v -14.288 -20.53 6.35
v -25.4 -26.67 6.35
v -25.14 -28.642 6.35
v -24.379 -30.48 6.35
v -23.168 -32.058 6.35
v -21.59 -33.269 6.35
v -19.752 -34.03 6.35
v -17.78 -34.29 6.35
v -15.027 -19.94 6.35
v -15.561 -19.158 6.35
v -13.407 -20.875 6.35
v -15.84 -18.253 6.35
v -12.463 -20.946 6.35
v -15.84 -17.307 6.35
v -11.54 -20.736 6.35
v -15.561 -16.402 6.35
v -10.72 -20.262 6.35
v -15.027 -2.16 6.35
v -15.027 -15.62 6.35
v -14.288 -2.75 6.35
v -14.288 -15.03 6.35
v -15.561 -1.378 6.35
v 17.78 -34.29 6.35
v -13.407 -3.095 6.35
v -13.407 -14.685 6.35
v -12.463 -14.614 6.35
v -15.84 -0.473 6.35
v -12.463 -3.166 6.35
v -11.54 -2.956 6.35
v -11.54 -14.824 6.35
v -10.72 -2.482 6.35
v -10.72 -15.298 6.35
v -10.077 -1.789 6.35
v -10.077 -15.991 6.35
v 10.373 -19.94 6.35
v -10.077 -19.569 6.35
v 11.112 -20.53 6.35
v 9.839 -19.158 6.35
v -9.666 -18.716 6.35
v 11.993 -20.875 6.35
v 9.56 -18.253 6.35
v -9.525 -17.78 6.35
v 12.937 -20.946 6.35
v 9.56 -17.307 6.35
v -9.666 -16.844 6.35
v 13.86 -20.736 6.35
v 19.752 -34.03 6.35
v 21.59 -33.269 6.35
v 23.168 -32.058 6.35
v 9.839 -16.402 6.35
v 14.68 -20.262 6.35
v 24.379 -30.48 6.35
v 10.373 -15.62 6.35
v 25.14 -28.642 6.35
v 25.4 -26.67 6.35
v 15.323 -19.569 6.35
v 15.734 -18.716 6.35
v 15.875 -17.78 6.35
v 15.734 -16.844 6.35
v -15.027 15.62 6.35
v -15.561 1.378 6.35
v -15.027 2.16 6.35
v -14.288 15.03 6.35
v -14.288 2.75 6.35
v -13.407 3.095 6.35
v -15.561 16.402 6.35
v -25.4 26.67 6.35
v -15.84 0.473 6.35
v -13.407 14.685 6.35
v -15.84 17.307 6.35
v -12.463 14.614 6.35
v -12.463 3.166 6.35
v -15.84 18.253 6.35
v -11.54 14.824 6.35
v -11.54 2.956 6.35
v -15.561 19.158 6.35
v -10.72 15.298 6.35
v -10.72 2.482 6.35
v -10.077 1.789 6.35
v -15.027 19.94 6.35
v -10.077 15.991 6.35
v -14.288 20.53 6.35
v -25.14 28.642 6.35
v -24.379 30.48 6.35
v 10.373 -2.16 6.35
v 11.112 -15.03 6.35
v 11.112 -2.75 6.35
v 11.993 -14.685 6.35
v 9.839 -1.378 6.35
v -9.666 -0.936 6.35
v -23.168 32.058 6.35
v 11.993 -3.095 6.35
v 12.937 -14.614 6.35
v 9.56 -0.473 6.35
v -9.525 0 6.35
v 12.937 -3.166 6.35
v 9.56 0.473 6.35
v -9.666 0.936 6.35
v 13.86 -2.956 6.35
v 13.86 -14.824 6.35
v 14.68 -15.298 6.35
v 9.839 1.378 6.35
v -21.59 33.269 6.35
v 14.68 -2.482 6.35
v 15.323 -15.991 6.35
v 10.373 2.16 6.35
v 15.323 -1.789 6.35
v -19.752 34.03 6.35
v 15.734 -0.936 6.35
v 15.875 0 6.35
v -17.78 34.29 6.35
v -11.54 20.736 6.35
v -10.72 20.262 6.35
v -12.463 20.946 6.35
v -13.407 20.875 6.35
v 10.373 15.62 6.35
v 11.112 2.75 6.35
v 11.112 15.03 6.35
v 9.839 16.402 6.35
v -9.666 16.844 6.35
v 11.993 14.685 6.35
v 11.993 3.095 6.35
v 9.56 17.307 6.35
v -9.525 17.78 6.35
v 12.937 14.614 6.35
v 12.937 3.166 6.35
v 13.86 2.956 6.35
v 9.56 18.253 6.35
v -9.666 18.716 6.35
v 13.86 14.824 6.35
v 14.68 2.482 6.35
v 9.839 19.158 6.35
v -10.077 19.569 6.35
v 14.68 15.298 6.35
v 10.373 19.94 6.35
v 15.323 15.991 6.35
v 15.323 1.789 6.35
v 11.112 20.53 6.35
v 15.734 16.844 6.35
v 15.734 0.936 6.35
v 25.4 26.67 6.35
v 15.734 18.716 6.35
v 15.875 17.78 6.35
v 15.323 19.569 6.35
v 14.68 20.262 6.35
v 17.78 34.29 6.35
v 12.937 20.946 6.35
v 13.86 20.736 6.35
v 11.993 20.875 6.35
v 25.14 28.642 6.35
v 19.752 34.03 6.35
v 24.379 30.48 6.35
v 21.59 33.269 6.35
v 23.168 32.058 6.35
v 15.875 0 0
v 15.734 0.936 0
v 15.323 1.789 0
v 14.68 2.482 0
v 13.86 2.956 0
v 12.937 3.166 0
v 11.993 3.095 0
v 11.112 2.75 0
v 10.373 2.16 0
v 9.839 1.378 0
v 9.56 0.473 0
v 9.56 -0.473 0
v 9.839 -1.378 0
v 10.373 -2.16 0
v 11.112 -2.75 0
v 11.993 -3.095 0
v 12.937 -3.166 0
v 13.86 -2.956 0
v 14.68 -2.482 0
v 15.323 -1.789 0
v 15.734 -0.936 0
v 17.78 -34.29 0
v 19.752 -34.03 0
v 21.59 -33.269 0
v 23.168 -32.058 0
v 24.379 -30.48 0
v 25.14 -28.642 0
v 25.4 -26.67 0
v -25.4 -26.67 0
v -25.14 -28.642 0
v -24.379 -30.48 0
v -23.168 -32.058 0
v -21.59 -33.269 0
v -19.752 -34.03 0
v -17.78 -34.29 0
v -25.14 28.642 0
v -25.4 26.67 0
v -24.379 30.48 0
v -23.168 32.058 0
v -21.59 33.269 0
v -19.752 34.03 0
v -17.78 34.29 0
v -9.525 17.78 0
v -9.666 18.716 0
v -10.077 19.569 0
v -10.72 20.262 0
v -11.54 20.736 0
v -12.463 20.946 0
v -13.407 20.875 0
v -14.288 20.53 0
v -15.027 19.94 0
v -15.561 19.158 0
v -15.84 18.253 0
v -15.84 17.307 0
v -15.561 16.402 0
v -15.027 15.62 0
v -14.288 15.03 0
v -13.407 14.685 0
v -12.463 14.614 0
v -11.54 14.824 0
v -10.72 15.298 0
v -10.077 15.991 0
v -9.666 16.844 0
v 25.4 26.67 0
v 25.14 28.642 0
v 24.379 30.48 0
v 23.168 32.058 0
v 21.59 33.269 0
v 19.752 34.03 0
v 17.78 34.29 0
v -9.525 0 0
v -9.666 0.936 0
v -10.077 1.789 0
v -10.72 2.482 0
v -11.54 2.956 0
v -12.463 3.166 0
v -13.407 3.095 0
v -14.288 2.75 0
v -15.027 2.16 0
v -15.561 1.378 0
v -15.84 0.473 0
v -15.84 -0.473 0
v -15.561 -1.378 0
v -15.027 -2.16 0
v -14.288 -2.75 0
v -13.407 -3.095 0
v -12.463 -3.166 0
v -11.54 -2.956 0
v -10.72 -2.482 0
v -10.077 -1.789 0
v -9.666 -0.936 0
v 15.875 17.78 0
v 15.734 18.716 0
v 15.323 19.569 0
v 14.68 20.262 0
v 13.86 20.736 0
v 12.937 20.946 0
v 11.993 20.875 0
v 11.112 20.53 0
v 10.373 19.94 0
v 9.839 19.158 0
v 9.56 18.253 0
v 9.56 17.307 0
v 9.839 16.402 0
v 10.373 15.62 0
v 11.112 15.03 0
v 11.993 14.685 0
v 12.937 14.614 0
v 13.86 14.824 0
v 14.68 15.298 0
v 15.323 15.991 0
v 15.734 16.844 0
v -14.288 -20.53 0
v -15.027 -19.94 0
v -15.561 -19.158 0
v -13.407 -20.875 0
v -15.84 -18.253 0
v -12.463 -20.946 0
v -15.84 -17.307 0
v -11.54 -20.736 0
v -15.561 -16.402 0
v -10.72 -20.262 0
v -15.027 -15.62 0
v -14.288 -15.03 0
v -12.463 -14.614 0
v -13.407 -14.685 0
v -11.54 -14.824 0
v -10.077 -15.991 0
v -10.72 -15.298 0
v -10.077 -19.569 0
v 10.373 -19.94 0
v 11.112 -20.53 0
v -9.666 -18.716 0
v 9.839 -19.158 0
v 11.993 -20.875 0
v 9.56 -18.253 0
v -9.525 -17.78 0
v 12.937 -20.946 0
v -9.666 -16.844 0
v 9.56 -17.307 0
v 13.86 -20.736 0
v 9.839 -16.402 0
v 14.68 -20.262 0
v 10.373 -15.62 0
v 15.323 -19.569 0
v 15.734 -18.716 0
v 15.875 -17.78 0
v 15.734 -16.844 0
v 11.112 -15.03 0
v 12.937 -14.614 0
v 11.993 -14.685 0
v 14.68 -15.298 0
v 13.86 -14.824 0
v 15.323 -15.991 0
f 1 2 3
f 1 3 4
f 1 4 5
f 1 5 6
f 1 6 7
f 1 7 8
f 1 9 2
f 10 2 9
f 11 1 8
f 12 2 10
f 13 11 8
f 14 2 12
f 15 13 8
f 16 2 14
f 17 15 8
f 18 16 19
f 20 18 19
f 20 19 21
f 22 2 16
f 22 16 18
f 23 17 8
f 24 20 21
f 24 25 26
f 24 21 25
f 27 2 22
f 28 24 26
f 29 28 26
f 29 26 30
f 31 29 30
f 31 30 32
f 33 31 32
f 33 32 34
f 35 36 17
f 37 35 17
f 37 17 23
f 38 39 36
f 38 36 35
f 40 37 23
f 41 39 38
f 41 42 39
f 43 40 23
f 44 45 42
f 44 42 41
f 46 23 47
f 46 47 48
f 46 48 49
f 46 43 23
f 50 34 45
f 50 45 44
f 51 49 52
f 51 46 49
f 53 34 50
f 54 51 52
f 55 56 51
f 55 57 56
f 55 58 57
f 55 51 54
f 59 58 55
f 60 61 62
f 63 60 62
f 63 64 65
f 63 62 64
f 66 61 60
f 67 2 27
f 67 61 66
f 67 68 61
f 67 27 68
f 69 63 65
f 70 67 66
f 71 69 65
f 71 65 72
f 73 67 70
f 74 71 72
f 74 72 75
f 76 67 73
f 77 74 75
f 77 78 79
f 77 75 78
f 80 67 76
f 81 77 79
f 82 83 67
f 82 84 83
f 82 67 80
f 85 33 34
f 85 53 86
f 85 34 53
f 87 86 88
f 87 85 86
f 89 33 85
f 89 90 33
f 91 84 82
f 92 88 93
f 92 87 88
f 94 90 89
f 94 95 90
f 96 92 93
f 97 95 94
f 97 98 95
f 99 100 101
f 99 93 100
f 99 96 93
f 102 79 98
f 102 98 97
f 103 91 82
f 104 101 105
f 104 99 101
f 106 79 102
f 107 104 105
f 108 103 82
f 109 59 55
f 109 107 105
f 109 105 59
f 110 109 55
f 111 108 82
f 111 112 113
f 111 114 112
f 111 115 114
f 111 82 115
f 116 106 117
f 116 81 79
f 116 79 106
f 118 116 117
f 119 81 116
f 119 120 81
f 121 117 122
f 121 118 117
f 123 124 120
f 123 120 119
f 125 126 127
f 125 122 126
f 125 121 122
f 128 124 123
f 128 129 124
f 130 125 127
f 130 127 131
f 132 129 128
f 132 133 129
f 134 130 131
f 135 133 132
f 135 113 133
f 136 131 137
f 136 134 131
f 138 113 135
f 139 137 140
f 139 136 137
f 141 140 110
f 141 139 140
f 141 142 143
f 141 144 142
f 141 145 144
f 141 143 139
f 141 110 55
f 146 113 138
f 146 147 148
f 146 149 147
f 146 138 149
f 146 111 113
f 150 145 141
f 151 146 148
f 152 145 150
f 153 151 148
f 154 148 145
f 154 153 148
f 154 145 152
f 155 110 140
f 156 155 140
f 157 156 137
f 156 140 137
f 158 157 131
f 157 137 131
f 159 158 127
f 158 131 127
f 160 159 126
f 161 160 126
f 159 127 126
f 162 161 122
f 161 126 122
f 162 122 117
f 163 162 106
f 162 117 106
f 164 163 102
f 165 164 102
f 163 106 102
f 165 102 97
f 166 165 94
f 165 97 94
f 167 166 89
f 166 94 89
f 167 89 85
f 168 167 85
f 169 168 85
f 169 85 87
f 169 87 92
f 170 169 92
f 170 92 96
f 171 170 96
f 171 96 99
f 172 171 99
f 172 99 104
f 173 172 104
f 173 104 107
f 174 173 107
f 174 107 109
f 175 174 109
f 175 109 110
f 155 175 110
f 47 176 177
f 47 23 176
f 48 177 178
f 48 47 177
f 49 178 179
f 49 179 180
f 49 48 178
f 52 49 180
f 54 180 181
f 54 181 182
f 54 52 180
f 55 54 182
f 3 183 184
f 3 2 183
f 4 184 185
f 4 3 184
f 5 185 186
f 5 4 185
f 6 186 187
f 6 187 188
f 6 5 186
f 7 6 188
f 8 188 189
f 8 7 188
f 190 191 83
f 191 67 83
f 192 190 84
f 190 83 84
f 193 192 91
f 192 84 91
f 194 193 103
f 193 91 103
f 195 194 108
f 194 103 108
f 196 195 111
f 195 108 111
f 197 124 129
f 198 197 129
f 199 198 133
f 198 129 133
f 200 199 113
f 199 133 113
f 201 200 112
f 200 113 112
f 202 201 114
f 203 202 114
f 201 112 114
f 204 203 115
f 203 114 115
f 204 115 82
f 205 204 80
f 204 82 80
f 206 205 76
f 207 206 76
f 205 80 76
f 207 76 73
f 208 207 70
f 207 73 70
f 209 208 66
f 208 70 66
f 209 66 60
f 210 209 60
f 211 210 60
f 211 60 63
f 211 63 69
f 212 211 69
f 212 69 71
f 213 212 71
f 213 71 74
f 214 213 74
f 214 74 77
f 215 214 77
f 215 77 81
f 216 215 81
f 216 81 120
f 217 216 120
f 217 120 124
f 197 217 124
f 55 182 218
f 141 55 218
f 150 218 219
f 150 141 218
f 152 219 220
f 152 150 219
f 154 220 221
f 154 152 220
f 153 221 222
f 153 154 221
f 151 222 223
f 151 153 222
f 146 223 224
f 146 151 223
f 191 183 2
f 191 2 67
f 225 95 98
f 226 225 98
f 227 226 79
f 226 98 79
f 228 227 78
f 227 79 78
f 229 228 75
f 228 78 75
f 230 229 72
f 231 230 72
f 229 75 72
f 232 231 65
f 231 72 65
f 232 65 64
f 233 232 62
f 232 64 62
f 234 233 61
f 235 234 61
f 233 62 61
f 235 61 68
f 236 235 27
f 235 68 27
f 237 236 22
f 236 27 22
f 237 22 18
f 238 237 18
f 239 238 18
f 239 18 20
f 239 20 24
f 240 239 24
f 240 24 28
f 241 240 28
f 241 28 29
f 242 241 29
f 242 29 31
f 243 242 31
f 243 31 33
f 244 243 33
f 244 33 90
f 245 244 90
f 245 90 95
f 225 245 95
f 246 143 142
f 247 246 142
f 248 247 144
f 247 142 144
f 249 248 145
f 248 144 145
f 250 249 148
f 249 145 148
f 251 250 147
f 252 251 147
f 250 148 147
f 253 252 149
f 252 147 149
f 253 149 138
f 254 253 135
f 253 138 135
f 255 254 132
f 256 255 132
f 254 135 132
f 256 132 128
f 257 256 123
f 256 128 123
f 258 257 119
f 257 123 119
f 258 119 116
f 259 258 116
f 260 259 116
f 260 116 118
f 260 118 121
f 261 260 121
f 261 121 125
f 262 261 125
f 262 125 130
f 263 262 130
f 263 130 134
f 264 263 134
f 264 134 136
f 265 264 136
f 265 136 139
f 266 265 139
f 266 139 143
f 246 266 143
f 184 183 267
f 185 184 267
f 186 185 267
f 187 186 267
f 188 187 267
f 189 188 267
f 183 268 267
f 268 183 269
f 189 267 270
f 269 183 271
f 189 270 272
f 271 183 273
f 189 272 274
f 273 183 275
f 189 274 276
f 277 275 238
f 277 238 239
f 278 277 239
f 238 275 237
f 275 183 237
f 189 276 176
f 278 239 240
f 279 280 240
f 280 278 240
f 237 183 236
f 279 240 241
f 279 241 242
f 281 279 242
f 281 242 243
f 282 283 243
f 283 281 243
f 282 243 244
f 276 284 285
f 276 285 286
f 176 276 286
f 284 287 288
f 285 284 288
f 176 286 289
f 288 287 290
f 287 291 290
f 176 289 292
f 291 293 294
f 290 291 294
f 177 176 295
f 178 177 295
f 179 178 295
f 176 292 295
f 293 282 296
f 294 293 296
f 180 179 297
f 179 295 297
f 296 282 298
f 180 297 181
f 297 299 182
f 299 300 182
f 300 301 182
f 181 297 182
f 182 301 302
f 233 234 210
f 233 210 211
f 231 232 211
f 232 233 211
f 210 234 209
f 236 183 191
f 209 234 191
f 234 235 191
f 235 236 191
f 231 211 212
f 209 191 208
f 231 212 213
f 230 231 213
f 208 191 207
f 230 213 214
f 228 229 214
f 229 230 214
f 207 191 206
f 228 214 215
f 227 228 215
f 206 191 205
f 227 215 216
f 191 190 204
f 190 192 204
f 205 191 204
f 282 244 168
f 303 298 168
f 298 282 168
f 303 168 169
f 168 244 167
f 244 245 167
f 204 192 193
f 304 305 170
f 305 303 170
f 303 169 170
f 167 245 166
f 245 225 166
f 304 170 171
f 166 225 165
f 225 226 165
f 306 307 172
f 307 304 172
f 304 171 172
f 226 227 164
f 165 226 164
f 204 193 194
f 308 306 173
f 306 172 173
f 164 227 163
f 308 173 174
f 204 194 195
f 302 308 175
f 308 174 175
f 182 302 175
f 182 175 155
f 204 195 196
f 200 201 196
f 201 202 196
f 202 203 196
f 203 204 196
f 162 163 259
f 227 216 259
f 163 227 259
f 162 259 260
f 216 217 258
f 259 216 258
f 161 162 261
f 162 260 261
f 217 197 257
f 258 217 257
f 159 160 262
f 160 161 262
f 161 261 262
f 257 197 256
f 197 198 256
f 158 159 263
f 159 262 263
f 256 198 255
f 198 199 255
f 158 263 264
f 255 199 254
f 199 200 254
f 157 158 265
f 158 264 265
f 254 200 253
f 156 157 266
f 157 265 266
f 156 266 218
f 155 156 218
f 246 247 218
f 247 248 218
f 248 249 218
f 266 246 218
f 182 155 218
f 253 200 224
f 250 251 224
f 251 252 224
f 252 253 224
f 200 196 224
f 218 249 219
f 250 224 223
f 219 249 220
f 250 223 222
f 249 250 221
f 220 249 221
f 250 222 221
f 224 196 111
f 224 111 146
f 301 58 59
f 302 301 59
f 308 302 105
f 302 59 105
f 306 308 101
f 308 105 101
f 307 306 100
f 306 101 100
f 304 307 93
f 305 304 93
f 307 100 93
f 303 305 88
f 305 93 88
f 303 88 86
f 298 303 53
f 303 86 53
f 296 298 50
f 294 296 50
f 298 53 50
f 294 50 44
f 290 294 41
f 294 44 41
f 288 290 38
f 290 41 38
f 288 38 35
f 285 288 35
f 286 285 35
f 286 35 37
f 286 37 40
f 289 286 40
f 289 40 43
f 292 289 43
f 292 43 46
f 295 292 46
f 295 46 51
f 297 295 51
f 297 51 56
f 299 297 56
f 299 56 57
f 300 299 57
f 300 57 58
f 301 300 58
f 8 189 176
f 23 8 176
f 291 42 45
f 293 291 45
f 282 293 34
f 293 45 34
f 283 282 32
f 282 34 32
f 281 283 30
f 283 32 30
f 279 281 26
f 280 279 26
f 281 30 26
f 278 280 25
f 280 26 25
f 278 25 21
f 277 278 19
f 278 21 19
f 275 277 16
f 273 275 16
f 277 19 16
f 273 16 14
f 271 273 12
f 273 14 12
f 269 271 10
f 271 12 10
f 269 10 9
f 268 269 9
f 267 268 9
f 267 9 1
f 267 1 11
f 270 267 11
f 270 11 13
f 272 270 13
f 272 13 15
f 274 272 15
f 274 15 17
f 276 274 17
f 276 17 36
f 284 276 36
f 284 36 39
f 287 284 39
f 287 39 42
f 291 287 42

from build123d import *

# Parameters (mm, degrees)
SKETCH2_W           = 50.8
SKETCH2_H           = 68.58
BOSS_EXTRUDE1_DEPTH = 6.35
FILLET1_R           = 7.62
SKETCH5_R           = 3.175
CUT_EXTRUDE1_DEPTH  = 44.142630889
LPATTERN1_COUNT     = 2
LPATTERN1_PITCH     = 17.78
LPATTERN1_COL_COUNT = 2
LPATTERN1_COL_PITCH = 17.78


with BuildPart() as part:
    # Sketch2 → Boss-Extrude1 (new body)
    with BuildSketch(Plane.XY):
        Rectangle(SKETCH2_W, SKETCH2_H)
    extrude(amount=BOSS_EXTRUDE1_DEPTH)

    # Fillet1
    fillet1_edges = [part.edges().sort_by_distance(p)[0] for p in [
        (25.4, -34.29, 3.175),
        (-25.4, -34.29, 3.175),
        (-25.4, 34.29, 3.175),
        (25.4, 34.29, 3.175),
    ]]
    fillet(fillet1_edges, radius=FILLET1_R)

    # Sketch5 → Cut-Extrude1 (cut, through all)
    with BuildSketch(Plane.XY.offset(6.35)):
        with Locations((-12.7, 0)):
            Circle(SKETCH5_R)
        with Locations((12.7, 0)):
            Circle(SKETCH5_R)
    cut_extrude1 = extrude(amount=-CUT_EXTRUDE1_DEPTH, mode=Mode.SUBTRACT)

    # LPattern1: Cut-Extrude1 ×2
    with Locations(*[(0, -i * LPATTERN1_PITCH, 0) for i in range(1, LPATTERN1_COUNT)]):
        add(cut_extrude1, mode=Mode.SUBTRACT)

    # LPattern1 col: Cut-Extrude1 ×2
    with Locations(*[(0, i * LPATTERN1_COL_PITCH, 0) for i in range(1, LPATTERN1_COL_COUNT)]):
        add(cut_extrude1, mode=Mode.SUBTRACT)


solid = part.part
